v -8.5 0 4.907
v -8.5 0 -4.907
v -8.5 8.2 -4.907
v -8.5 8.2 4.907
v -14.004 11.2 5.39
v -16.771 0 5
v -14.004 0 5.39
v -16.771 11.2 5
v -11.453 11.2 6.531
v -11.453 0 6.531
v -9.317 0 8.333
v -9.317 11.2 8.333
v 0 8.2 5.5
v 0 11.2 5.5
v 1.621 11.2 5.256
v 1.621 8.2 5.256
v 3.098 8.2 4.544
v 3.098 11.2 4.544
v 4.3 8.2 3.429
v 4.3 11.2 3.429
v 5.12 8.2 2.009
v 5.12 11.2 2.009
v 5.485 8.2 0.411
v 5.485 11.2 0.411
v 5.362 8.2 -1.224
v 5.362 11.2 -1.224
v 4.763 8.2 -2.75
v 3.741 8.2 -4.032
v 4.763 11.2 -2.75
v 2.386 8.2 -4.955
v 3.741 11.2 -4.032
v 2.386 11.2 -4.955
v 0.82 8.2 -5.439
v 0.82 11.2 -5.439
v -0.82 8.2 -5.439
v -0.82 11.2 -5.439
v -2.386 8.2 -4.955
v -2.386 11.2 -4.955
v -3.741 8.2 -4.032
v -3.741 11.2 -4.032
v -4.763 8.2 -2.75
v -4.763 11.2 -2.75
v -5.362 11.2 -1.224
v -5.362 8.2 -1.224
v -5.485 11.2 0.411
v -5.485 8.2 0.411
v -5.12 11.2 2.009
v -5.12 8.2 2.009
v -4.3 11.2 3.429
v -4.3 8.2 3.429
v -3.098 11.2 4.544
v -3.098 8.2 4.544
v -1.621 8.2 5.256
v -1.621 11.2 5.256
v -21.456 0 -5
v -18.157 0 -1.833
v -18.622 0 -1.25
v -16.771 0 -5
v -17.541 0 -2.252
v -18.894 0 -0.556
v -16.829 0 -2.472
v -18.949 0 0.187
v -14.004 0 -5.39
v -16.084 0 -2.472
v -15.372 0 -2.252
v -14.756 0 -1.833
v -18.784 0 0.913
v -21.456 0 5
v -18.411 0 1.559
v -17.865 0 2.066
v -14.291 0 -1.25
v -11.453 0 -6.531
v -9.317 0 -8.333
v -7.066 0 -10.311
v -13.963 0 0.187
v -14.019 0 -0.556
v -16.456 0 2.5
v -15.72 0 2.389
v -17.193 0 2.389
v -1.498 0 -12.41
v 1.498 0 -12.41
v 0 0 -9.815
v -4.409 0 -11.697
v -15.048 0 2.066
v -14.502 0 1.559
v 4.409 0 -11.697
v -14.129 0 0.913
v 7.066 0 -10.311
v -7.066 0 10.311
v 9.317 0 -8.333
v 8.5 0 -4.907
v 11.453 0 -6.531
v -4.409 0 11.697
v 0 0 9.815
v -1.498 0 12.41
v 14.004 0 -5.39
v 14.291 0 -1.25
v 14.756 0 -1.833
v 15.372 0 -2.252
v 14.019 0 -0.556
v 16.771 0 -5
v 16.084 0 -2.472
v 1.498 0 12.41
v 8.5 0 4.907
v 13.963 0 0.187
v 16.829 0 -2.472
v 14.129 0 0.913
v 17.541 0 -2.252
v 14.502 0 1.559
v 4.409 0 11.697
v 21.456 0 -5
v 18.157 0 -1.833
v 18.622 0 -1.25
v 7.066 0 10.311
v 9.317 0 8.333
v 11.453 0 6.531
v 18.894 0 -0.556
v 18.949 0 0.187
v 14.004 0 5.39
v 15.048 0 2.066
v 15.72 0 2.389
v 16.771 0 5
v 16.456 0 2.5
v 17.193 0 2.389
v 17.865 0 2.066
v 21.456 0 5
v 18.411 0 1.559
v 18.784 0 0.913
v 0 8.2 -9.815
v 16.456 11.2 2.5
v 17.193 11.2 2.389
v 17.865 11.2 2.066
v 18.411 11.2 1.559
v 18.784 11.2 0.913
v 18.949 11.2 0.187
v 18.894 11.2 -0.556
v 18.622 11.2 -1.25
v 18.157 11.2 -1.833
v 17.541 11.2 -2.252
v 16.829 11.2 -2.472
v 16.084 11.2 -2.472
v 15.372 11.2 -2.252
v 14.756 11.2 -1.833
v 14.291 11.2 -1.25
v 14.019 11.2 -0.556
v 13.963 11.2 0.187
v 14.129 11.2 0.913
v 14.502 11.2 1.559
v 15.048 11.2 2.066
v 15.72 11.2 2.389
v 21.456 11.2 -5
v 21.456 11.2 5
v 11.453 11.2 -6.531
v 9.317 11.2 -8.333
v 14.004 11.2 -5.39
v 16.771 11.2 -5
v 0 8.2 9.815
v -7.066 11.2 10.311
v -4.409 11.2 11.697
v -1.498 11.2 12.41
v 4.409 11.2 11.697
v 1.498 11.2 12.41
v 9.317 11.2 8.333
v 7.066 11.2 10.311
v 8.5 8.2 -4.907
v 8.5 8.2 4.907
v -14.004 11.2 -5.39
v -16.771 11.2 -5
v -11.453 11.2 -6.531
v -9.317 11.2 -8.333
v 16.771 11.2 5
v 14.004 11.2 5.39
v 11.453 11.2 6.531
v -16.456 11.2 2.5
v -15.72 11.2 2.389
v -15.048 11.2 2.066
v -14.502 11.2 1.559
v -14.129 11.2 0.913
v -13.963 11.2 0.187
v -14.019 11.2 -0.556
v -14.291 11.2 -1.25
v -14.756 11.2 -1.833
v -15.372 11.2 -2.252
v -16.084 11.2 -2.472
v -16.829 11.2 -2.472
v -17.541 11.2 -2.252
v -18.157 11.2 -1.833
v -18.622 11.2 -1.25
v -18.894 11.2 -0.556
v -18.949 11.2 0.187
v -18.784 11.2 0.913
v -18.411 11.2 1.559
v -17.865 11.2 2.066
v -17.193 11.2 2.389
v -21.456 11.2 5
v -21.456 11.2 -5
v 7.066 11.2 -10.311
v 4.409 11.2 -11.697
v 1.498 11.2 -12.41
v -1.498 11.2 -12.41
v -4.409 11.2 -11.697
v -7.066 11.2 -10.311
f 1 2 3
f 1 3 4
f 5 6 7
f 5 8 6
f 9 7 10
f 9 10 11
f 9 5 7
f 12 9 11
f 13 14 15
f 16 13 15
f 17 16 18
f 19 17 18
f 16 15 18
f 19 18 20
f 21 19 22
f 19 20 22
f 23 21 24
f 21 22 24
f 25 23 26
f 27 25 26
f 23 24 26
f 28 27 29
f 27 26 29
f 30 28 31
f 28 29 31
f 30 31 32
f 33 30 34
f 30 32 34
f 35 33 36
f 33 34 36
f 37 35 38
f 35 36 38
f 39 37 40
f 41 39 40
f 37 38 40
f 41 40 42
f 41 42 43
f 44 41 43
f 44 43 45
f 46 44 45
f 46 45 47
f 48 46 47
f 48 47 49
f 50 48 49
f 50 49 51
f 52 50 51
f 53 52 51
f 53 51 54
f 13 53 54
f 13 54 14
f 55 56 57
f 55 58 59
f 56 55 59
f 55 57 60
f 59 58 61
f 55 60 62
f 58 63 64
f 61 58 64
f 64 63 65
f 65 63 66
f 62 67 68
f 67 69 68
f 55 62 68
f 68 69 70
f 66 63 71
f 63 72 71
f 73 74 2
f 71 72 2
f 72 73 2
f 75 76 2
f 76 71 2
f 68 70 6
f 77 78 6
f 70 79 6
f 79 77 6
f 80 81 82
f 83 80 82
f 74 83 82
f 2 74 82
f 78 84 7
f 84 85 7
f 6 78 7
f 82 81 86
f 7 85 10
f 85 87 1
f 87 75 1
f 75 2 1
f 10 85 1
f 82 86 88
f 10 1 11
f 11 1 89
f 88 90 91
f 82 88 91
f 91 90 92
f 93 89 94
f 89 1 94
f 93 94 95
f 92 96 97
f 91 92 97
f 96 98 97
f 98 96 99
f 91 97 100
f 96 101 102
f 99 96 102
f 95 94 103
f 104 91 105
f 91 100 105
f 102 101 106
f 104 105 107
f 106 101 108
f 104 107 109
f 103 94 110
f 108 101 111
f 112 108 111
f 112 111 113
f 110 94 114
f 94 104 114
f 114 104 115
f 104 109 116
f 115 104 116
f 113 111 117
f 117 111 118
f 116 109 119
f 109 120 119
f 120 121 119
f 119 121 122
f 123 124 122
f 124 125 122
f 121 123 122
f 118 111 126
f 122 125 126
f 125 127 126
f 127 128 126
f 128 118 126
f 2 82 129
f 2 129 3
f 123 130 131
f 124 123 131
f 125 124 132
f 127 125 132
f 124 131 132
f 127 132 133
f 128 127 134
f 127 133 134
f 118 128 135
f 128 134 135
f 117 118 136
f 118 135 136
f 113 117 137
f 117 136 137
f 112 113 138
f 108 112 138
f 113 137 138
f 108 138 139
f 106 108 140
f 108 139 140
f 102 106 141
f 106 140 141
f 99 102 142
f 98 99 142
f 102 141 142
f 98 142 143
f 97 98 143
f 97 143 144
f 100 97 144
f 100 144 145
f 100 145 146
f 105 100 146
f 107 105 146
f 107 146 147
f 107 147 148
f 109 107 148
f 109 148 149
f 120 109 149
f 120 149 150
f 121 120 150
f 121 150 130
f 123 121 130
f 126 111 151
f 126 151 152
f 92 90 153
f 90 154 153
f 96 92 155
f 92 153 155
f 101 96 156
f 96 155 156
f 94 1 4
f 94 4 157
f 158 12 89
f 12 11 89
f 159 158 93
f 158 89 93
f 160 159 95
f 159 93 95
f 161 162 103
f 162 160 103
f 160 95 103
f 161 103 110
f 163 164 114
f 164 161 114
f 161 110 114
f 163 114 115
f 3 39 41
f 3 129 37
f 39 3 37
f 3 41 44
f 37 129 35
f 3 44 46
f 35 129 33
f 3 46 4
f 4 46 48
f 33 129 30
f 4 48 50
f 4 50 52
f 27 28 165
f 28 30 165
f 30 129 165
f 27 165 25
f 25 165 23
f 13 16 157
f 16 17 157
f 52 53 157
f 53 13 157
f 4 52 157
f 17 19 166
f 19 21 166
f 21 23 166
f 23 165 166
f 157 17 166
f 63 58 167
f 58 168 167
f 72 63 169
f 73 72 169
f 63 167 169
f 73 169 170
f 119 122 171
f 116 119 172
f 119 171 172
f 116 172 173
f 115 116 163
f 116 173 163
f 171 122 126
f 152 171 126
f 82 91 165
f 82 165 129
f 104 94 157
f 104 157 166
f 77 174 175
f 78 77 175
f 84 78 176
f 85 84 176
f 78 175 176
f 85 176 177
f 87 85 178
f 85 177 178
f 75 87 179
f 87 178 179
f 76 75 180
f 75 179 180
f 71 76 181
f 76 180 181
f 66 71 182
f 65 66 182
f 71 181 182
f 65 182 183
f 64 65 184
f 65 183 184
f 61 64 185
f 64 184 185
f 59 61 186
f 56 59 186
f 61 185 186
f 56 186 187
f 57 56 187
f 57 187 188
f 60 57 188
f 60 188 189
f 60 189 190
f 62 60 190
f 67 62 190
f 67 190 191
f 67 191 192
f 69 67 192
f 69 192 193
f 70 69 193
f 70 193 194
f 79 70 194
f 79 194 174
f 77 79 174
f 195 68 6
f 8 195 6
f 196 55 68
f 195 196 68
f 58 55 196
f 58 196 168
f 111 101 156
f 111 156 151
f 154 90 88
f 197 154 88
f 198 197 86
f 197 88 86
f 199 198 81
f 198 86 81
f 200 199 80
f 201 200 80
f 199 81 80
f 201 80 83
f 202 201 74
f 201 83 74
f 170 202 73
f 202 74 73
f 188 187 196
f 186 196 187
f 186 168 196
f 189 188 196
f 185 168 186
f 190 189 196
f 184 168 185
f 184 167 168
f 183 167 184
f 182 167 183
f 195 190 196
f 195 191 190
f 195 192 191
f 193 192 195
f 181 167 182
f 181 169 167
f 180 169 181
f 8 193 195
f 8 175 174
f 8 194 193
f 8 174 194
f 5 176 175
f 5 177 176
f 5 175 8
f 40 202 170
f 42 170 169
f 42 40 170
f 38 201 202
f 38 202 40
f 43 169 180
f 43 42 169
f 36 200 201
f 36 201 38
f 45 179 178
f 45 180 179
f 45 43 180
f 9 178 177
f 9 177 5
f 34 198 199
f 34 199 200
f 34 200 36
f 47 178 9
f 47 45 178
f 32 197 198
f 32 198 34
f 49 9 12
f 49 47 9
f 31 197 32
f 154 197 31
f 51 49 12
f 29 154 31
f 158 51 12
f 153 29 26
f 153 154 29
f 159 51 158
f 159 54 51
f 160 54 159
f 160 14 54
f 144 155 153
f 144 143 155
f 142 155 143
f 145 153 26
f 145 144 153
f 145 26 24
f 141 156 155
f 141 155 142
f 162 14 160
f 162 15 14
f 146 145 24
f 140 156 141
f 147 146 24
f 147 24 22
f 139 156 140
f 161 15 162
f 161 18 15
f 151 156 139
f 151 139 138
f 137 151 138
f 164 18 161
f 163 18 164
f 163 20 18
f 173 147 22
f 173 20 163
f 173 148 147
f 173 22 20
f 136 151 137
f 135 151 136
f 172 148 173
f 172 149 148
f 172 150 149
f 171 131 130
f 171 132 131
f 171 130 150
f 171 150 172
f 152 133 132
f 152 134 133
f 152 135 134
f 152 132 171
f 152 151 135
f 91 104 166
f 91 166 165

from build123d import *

# Parameters (mm, degrees)
SKETCH_1_R          = 12.5
EXTRUDE_1_DEPTH     = 8.2
SKETCH_2_R          = 12.5
EXTRUDE_2_DEPTH     = 3
SKETCH_3_W          = 10
SKETCH_3_H          = 10
EXTRUDE_3_DEPTH     = 11.2
FILLET_1_R          = 10
SKETCH_4_R          = 2.5
CUT_EXTRUDE_4_DEPTH = 28.240939498
SKETCH_5_R          = 5.5
CUT_EXTRUDE_5_DEPTH = 4


with BuildPart() as part:
    # Эскиз1 → Вытянуть1 (new body)
    with BuildSketch(Plane(origin=(0, 0, 0), x_dir=(1, 0, 0), z_dir=(0, 1, 0))):
        with Locations(Location((0, 0, 0), (0, 0, 270))):
            Circle(SKETCH_1_R)
        Polygon((8.5, -4.907477288), (8.5, 4.907477288), (0, 9.814954576), (-8.5, 4.907477288), (-8.5, -4.907477288), (0, -9.814954576), align=None, mode=Mode.SUBTRACT)
    extrude(amount=EXTRUDE_1_DEPTH)

    # Эскиз2 → Вытянуть2 (add)
    with BuildSketch(Plane(origin=(0, 8.2, 0), x_dir=(1, 0, 0), z_dir=(0, 1, 0))):
        with Locations(Location((0, 0, 0), (0, 0, 270))):
            Circle(SKETCH_2_R)
    extrude(amount=EXTRUDE_2_DEPTH)

    # Эскиз3 → Вытянуть3 (add)
    with BuildSketch(Plane.XZ):
        with Locations((16.456439237, 0)):
            Rectangle(SKETCH_3_W, SKETCH_3_H)
        with Locations((-16.456439237, 0)):
            Rectangle(SKETCH_3_W, SKETCH_3_H)
    extrude(amount=-EXTRUDE_3_DEPTH)

    # Скругление1
    fillet_1_edges = [part.edges().sort_by_distance(p)[0] for p in [
        (11.456439237, 5.6, 5),
        (11.456439237, 5.6, -5),
        (-11.456439237, 5.6, -5),
        (-11.456439237, 5.6, 5),
    ]]
    fillet(fillet_1_edges, radius=FILLET_1_R)

    # Эскиз4 → Вытянуть4 (cut, through all)
    with BuildSketch(Plane(origin=(0, 11.2, 0), x_dir=(1, 0, 0), z_dir=(0, 1, 0))):
        with Locations(Location((16.456439237, 0, 0), (0, 0, 270))):
            Circle(SKETCH_4_R)
        with Locations(Location((-16.456439237, 0, 0), (0, 0, 270))):
            Circle(SKETCH_4_R)
    extrude(amount=-CUT_EXTRUDE_4_DEPTH, mode=Mode.SUBTRACT)

    # Эскиз5 → Вытянуть5 (cut)
    with BuildSketch(Plane(origin=(0, 11.2, 0), x_dir=(1, 0, 0), z_dir=(0, 1, 0))):
        with Locations(Location((0, 0, 0), (0, 0, 270))):
            Circle(SKETCH_5_R)
    extrude(amount=-CUT_EXTRUDE_5_DEPTH, mode=Mode.SUBTRACT)


solid = part.part
